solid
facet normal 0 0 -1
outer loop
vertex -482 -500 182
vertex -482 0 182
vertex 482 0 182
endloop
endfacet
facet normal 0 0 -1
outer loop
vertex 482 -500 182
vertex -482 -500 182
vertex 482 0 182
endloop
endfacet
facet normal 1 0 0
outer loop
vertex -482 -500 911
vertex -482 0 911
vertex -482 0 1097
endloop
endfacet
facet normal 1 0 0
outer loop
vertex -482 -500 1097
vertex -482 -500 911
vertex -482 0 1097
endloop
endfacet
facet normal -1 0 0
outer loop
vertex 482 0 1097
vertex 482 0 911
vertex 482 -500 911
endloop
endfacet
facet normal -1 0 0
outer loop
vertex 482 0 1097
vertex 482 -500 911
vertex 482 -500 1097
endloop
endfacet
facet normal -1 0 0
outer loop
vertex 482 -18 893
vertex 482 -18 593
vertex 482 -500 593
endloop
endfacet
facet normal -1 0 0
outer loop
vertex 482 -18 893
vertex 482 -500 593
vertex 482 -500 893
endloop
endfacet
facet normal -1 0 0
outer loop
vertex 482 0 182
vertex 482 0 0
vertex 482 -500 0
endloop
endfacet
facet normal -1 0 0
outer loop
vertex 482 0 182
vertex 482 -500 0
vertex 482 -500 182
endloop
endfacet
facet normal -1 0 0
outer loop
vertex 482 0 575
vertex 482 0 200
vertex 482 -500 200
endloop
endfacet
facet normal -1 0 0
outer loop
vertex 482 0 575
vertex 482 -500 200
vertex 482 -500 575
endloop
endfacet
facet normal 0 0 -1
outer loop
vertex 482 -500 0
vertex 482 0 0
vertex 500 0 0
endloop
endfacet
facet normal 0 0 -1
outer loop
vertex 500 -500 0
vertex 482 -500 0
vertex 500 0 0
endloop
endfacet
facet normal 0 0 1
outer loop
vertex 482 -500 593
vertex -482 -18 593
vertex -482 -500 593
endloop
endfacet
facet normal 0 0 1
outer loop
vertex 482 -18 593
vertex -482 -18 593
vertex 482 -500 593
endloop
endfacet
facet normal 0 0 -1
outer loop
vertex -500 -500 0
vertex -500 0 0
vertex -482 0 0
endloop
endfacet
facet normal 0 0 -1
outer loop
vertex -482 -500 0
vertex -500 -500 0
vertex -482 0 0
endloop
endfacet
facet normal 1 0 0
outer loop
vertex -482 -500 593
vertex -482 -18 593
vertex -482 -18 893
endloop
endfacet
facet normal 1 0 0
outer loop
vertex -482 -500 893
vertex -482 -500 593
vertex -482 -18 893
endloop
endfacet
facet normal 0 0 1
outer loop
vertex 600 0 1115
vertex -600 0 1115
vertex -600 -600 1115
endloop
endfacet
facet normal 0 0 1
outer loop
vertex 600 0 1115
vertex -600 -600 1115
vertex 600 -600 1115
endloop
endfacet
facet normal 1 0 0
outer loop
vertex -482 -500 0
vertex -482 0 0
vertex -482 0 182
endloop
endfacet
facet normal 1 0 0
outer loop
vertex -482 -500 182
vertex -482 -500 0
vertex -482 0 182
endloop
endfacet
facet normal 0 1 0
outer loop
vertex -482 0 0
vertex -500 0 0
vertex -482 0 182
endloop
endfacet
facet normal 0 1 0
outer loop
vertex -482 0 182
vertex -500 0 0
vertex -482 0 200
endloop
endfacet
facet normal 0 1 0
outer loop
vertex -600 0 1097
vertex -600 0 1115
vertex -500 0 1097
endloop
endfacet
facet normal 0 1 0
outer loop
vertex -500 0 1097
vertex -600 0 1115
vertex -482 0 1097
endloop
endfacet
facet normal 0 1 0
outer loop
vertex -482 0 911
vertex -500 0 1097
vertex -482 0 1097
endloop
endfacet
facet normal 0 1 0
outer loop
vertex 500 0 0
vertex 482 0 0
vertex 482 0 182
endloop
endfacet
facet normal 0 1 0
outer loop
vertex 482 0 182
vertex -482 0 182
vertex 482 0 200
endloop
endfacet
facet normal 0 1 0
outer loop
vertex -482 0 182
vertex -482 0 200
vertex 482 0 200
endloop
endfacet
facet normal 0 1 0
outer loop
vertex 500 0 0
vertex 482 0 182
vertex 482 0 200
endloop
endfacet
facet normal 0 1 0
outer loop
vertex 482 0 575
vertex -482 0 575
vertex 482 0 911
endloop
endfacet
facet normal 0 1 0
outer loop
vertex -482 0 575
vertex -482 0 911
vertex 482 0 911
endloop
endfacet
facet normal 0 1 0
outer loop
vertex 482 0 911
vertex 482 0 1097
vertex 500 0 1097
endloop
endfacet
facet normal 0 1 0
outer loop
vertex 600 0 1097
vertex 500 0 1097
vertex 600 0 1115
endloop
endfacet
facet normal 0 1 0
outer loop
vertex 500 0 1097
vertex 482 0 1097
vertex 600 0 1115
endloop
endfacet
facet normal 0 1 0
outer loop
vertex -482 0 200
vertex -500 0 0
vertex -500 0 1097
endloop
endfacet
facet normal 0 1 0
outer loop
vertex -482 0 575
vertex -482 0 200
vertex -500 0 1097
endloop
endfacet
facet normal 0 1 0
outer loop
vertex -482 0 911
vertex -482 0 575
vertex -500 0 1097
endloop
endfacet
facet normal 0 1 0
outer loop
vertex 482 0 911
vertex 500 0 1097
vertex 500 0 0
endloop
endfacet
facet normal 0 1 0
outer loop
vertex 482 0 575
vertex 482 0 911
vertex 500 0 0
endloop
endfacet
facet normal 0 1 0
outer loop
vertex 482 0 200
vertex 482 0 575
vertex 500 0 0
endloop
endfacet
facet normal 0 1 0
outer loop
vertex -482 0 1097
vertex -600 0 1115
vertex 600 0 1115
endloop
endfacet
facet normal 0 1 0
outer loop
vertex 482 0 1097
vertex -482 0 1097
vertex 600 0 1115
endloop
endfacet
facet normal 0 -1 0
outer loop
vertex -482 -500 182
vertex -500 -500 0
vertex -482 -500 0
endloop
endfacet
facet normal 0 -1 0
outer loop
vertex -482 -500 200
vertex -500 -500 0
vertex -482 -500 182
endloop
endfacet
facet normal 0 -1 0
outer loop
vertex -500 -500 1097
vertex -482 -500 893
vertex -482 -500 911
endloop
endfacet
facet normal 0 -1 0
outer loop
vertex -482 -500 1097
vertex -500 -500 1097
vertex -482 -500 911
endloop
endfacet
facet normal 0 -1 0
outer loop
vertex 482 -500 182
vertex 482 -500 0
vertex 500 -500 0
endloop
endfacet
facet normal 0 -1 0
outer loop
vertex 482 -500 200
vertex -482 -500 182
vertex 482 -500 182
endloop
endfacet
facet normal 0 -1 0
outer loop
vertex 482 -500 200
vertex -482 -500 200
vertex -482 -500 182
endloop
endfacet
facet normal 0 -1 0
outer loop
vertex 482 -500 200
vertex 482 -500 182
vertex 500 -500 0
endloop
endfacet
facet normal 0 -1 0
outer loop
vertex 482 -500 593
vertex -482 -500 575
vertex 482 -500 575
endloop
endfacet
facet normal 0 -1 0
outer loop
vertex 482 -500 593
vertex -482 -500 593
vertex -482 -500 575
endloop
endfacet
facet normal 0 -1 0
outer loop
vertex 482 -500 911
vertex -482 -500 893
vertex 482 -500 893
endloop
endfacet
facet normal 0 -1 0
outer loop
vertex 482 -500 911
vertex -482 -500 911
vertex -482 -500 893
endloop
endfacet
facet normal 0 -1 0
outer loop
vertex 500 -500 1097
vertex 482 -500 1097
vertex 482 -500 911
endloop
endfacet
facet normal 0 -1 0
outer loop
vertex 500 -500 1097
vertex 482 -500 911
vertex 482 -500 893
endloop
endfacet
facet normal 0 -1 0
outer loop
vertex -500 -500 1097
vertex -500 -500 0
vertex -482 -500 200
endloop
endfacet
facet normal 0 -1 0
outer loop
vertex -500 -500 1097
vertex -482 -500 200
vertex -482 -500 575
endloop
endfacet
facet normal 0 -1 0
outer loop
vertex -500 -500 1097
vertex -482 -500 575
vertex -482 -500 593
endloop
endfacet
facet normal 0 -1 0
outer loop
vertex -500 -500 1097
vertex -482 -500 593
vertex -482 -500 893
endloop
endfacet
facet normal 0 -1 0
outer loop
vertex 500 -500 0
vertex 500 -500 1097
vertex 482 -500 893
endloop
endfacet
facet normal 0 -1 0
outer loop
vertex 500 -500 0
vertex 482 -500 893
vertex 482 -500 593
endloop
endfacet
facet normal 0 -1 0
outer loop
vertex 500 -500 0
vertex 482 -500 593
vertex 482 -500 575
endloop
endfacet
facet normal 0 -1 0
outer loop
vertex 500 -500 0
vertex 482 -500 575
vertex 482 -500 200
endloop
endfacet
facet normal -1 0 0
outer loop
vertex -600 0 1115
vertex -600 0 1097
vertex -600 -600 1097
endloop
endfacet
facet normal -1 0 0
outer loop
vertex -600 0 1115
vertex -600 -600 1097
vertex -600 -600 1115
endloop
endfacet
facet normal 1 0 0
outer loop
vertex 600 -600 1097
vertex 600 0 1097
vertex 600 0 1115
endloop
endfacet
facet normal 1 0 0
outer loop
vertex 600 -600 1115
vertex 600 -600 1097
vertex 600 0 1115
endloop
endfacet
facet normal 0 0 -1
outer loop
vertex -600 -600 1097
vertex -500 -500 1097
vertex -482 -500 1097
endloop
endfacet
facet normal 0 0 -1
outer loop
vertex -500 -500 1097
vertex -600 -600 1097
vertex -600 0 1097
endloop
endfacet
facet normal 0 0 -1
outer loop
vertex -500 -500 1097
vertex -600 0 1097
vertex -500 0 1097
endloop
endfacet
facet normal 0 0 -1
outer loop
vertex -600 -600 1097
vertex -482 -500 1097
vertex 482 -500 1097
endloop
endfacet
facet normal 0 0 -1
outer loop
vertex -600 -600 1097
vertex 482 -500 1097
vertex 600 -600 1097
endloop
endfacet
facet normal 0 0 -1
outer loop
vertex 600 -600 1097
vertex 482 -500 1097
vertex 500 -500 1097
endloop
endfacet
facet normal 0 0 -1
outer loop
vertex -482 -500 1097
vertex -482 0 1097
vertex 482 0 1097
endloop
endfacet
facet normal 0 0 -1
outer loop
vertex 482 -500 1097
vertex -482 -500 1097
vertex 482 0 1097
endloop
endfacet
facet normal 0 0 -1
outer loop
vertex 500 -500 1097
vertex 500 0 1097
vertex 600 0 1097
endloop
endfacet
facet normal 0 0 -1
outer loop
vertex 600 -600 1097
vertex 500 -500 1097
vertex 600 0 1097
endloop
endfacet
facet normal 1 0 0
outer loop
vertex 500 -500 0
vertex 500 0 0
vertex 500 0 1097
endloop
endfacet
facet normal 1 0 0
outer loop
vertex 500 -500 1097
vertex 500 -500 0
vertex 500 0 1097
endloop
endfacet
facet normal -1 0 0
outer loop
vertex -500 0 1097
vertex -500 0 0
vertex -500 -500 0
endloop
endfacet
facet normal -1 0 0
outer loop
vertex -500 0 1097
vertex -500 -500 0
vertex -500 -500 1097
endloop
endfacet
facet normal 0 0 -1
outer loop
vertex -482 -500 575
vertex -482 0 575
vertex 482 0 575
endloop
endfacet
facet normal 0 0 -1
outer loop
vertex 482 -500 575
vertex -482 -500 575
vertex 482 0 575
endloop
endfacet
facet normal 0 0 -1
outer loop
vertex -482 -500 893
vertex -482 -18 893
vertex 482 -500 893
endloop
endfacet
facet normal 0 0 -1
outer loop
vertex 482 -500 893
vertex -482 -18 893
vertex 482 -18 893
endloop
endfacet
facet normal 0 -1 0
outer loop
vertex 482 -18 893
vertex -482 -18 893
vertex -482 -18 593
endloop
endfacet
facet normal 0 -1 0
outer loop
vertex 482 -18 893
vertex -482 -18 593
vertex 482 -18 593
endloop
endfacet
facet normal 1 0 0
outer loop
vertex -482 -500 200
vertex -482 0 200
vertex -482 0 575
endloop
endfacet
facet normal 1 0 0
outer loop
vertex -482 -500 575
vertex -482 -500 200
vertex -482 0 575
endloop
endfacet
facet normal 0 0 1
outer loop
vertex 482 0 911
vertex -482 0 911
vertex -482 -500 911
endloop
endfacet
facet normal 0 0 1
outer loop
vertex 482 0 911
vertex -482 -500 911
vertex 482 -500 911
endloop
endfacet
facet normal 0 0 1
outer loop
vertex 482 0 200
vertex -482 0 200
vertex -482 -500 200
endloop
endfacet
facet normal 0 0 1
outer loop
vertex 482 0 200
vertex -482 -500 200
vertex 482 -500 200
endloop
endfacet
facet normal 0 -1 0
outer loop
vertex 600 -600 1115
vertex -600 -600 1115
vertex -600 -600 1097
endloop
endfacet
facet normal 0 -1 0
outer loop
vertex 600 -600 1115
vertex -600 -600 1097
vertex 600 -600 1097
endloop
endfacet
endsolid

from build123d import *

# Parameters (mm, degrees)
F0_W     = 1200
F0_H     = 18
F1_DEPTH = 600
F2_W     = 18
F2_H     = 1097
F3_DEPTH = 500
F4_W     = 964
F4_H     = 18
F5_DEPTH = 500
F6_W     = 964
F6_H     = 300
F7_DEPTH = 18


with BuildPart() as f1:
    # F0 (on Front) → F1 (new body)
    with BuildSketch(Plane.XZ):
        with Locations((0, 1106)):
            Rectangle(F0_W, F0_H)
    extrude(amount=F1_DEPTH)

    # F2 (on Front) → F3 (join)
    with BuildSketch(Plane.XZ):
        with Locations((-491, 548.5)):
            Rectangle(F2_W, F2_H)
        with Locations((491, 548.5)):
            Rectangle(F2_W, F2_H)
    extrude(amount=F3_DEPTH)

    # F4 (on Front) → F5 (join)
    with BuildSketch(Plane.XZ):
        with Locations((0, 191)):
            Rectangle(F4_W, F4_H)
        with Locations((0, 584)):
            Rectangle(F4_W, F4_H)
        with Locations((0, 902)):
            Rectangle(F4_W, F4_H)
    extrude(amount=F5_DEPTH)

    # F6 (on Front) → F7 (join)
    with BuildSketch(Plane.XZ):
        with Locations((0, 743)):
            Rectangle(F6_W, F6_H)
    extrude(amount=F7_DEPTH)


solid = f1.part
